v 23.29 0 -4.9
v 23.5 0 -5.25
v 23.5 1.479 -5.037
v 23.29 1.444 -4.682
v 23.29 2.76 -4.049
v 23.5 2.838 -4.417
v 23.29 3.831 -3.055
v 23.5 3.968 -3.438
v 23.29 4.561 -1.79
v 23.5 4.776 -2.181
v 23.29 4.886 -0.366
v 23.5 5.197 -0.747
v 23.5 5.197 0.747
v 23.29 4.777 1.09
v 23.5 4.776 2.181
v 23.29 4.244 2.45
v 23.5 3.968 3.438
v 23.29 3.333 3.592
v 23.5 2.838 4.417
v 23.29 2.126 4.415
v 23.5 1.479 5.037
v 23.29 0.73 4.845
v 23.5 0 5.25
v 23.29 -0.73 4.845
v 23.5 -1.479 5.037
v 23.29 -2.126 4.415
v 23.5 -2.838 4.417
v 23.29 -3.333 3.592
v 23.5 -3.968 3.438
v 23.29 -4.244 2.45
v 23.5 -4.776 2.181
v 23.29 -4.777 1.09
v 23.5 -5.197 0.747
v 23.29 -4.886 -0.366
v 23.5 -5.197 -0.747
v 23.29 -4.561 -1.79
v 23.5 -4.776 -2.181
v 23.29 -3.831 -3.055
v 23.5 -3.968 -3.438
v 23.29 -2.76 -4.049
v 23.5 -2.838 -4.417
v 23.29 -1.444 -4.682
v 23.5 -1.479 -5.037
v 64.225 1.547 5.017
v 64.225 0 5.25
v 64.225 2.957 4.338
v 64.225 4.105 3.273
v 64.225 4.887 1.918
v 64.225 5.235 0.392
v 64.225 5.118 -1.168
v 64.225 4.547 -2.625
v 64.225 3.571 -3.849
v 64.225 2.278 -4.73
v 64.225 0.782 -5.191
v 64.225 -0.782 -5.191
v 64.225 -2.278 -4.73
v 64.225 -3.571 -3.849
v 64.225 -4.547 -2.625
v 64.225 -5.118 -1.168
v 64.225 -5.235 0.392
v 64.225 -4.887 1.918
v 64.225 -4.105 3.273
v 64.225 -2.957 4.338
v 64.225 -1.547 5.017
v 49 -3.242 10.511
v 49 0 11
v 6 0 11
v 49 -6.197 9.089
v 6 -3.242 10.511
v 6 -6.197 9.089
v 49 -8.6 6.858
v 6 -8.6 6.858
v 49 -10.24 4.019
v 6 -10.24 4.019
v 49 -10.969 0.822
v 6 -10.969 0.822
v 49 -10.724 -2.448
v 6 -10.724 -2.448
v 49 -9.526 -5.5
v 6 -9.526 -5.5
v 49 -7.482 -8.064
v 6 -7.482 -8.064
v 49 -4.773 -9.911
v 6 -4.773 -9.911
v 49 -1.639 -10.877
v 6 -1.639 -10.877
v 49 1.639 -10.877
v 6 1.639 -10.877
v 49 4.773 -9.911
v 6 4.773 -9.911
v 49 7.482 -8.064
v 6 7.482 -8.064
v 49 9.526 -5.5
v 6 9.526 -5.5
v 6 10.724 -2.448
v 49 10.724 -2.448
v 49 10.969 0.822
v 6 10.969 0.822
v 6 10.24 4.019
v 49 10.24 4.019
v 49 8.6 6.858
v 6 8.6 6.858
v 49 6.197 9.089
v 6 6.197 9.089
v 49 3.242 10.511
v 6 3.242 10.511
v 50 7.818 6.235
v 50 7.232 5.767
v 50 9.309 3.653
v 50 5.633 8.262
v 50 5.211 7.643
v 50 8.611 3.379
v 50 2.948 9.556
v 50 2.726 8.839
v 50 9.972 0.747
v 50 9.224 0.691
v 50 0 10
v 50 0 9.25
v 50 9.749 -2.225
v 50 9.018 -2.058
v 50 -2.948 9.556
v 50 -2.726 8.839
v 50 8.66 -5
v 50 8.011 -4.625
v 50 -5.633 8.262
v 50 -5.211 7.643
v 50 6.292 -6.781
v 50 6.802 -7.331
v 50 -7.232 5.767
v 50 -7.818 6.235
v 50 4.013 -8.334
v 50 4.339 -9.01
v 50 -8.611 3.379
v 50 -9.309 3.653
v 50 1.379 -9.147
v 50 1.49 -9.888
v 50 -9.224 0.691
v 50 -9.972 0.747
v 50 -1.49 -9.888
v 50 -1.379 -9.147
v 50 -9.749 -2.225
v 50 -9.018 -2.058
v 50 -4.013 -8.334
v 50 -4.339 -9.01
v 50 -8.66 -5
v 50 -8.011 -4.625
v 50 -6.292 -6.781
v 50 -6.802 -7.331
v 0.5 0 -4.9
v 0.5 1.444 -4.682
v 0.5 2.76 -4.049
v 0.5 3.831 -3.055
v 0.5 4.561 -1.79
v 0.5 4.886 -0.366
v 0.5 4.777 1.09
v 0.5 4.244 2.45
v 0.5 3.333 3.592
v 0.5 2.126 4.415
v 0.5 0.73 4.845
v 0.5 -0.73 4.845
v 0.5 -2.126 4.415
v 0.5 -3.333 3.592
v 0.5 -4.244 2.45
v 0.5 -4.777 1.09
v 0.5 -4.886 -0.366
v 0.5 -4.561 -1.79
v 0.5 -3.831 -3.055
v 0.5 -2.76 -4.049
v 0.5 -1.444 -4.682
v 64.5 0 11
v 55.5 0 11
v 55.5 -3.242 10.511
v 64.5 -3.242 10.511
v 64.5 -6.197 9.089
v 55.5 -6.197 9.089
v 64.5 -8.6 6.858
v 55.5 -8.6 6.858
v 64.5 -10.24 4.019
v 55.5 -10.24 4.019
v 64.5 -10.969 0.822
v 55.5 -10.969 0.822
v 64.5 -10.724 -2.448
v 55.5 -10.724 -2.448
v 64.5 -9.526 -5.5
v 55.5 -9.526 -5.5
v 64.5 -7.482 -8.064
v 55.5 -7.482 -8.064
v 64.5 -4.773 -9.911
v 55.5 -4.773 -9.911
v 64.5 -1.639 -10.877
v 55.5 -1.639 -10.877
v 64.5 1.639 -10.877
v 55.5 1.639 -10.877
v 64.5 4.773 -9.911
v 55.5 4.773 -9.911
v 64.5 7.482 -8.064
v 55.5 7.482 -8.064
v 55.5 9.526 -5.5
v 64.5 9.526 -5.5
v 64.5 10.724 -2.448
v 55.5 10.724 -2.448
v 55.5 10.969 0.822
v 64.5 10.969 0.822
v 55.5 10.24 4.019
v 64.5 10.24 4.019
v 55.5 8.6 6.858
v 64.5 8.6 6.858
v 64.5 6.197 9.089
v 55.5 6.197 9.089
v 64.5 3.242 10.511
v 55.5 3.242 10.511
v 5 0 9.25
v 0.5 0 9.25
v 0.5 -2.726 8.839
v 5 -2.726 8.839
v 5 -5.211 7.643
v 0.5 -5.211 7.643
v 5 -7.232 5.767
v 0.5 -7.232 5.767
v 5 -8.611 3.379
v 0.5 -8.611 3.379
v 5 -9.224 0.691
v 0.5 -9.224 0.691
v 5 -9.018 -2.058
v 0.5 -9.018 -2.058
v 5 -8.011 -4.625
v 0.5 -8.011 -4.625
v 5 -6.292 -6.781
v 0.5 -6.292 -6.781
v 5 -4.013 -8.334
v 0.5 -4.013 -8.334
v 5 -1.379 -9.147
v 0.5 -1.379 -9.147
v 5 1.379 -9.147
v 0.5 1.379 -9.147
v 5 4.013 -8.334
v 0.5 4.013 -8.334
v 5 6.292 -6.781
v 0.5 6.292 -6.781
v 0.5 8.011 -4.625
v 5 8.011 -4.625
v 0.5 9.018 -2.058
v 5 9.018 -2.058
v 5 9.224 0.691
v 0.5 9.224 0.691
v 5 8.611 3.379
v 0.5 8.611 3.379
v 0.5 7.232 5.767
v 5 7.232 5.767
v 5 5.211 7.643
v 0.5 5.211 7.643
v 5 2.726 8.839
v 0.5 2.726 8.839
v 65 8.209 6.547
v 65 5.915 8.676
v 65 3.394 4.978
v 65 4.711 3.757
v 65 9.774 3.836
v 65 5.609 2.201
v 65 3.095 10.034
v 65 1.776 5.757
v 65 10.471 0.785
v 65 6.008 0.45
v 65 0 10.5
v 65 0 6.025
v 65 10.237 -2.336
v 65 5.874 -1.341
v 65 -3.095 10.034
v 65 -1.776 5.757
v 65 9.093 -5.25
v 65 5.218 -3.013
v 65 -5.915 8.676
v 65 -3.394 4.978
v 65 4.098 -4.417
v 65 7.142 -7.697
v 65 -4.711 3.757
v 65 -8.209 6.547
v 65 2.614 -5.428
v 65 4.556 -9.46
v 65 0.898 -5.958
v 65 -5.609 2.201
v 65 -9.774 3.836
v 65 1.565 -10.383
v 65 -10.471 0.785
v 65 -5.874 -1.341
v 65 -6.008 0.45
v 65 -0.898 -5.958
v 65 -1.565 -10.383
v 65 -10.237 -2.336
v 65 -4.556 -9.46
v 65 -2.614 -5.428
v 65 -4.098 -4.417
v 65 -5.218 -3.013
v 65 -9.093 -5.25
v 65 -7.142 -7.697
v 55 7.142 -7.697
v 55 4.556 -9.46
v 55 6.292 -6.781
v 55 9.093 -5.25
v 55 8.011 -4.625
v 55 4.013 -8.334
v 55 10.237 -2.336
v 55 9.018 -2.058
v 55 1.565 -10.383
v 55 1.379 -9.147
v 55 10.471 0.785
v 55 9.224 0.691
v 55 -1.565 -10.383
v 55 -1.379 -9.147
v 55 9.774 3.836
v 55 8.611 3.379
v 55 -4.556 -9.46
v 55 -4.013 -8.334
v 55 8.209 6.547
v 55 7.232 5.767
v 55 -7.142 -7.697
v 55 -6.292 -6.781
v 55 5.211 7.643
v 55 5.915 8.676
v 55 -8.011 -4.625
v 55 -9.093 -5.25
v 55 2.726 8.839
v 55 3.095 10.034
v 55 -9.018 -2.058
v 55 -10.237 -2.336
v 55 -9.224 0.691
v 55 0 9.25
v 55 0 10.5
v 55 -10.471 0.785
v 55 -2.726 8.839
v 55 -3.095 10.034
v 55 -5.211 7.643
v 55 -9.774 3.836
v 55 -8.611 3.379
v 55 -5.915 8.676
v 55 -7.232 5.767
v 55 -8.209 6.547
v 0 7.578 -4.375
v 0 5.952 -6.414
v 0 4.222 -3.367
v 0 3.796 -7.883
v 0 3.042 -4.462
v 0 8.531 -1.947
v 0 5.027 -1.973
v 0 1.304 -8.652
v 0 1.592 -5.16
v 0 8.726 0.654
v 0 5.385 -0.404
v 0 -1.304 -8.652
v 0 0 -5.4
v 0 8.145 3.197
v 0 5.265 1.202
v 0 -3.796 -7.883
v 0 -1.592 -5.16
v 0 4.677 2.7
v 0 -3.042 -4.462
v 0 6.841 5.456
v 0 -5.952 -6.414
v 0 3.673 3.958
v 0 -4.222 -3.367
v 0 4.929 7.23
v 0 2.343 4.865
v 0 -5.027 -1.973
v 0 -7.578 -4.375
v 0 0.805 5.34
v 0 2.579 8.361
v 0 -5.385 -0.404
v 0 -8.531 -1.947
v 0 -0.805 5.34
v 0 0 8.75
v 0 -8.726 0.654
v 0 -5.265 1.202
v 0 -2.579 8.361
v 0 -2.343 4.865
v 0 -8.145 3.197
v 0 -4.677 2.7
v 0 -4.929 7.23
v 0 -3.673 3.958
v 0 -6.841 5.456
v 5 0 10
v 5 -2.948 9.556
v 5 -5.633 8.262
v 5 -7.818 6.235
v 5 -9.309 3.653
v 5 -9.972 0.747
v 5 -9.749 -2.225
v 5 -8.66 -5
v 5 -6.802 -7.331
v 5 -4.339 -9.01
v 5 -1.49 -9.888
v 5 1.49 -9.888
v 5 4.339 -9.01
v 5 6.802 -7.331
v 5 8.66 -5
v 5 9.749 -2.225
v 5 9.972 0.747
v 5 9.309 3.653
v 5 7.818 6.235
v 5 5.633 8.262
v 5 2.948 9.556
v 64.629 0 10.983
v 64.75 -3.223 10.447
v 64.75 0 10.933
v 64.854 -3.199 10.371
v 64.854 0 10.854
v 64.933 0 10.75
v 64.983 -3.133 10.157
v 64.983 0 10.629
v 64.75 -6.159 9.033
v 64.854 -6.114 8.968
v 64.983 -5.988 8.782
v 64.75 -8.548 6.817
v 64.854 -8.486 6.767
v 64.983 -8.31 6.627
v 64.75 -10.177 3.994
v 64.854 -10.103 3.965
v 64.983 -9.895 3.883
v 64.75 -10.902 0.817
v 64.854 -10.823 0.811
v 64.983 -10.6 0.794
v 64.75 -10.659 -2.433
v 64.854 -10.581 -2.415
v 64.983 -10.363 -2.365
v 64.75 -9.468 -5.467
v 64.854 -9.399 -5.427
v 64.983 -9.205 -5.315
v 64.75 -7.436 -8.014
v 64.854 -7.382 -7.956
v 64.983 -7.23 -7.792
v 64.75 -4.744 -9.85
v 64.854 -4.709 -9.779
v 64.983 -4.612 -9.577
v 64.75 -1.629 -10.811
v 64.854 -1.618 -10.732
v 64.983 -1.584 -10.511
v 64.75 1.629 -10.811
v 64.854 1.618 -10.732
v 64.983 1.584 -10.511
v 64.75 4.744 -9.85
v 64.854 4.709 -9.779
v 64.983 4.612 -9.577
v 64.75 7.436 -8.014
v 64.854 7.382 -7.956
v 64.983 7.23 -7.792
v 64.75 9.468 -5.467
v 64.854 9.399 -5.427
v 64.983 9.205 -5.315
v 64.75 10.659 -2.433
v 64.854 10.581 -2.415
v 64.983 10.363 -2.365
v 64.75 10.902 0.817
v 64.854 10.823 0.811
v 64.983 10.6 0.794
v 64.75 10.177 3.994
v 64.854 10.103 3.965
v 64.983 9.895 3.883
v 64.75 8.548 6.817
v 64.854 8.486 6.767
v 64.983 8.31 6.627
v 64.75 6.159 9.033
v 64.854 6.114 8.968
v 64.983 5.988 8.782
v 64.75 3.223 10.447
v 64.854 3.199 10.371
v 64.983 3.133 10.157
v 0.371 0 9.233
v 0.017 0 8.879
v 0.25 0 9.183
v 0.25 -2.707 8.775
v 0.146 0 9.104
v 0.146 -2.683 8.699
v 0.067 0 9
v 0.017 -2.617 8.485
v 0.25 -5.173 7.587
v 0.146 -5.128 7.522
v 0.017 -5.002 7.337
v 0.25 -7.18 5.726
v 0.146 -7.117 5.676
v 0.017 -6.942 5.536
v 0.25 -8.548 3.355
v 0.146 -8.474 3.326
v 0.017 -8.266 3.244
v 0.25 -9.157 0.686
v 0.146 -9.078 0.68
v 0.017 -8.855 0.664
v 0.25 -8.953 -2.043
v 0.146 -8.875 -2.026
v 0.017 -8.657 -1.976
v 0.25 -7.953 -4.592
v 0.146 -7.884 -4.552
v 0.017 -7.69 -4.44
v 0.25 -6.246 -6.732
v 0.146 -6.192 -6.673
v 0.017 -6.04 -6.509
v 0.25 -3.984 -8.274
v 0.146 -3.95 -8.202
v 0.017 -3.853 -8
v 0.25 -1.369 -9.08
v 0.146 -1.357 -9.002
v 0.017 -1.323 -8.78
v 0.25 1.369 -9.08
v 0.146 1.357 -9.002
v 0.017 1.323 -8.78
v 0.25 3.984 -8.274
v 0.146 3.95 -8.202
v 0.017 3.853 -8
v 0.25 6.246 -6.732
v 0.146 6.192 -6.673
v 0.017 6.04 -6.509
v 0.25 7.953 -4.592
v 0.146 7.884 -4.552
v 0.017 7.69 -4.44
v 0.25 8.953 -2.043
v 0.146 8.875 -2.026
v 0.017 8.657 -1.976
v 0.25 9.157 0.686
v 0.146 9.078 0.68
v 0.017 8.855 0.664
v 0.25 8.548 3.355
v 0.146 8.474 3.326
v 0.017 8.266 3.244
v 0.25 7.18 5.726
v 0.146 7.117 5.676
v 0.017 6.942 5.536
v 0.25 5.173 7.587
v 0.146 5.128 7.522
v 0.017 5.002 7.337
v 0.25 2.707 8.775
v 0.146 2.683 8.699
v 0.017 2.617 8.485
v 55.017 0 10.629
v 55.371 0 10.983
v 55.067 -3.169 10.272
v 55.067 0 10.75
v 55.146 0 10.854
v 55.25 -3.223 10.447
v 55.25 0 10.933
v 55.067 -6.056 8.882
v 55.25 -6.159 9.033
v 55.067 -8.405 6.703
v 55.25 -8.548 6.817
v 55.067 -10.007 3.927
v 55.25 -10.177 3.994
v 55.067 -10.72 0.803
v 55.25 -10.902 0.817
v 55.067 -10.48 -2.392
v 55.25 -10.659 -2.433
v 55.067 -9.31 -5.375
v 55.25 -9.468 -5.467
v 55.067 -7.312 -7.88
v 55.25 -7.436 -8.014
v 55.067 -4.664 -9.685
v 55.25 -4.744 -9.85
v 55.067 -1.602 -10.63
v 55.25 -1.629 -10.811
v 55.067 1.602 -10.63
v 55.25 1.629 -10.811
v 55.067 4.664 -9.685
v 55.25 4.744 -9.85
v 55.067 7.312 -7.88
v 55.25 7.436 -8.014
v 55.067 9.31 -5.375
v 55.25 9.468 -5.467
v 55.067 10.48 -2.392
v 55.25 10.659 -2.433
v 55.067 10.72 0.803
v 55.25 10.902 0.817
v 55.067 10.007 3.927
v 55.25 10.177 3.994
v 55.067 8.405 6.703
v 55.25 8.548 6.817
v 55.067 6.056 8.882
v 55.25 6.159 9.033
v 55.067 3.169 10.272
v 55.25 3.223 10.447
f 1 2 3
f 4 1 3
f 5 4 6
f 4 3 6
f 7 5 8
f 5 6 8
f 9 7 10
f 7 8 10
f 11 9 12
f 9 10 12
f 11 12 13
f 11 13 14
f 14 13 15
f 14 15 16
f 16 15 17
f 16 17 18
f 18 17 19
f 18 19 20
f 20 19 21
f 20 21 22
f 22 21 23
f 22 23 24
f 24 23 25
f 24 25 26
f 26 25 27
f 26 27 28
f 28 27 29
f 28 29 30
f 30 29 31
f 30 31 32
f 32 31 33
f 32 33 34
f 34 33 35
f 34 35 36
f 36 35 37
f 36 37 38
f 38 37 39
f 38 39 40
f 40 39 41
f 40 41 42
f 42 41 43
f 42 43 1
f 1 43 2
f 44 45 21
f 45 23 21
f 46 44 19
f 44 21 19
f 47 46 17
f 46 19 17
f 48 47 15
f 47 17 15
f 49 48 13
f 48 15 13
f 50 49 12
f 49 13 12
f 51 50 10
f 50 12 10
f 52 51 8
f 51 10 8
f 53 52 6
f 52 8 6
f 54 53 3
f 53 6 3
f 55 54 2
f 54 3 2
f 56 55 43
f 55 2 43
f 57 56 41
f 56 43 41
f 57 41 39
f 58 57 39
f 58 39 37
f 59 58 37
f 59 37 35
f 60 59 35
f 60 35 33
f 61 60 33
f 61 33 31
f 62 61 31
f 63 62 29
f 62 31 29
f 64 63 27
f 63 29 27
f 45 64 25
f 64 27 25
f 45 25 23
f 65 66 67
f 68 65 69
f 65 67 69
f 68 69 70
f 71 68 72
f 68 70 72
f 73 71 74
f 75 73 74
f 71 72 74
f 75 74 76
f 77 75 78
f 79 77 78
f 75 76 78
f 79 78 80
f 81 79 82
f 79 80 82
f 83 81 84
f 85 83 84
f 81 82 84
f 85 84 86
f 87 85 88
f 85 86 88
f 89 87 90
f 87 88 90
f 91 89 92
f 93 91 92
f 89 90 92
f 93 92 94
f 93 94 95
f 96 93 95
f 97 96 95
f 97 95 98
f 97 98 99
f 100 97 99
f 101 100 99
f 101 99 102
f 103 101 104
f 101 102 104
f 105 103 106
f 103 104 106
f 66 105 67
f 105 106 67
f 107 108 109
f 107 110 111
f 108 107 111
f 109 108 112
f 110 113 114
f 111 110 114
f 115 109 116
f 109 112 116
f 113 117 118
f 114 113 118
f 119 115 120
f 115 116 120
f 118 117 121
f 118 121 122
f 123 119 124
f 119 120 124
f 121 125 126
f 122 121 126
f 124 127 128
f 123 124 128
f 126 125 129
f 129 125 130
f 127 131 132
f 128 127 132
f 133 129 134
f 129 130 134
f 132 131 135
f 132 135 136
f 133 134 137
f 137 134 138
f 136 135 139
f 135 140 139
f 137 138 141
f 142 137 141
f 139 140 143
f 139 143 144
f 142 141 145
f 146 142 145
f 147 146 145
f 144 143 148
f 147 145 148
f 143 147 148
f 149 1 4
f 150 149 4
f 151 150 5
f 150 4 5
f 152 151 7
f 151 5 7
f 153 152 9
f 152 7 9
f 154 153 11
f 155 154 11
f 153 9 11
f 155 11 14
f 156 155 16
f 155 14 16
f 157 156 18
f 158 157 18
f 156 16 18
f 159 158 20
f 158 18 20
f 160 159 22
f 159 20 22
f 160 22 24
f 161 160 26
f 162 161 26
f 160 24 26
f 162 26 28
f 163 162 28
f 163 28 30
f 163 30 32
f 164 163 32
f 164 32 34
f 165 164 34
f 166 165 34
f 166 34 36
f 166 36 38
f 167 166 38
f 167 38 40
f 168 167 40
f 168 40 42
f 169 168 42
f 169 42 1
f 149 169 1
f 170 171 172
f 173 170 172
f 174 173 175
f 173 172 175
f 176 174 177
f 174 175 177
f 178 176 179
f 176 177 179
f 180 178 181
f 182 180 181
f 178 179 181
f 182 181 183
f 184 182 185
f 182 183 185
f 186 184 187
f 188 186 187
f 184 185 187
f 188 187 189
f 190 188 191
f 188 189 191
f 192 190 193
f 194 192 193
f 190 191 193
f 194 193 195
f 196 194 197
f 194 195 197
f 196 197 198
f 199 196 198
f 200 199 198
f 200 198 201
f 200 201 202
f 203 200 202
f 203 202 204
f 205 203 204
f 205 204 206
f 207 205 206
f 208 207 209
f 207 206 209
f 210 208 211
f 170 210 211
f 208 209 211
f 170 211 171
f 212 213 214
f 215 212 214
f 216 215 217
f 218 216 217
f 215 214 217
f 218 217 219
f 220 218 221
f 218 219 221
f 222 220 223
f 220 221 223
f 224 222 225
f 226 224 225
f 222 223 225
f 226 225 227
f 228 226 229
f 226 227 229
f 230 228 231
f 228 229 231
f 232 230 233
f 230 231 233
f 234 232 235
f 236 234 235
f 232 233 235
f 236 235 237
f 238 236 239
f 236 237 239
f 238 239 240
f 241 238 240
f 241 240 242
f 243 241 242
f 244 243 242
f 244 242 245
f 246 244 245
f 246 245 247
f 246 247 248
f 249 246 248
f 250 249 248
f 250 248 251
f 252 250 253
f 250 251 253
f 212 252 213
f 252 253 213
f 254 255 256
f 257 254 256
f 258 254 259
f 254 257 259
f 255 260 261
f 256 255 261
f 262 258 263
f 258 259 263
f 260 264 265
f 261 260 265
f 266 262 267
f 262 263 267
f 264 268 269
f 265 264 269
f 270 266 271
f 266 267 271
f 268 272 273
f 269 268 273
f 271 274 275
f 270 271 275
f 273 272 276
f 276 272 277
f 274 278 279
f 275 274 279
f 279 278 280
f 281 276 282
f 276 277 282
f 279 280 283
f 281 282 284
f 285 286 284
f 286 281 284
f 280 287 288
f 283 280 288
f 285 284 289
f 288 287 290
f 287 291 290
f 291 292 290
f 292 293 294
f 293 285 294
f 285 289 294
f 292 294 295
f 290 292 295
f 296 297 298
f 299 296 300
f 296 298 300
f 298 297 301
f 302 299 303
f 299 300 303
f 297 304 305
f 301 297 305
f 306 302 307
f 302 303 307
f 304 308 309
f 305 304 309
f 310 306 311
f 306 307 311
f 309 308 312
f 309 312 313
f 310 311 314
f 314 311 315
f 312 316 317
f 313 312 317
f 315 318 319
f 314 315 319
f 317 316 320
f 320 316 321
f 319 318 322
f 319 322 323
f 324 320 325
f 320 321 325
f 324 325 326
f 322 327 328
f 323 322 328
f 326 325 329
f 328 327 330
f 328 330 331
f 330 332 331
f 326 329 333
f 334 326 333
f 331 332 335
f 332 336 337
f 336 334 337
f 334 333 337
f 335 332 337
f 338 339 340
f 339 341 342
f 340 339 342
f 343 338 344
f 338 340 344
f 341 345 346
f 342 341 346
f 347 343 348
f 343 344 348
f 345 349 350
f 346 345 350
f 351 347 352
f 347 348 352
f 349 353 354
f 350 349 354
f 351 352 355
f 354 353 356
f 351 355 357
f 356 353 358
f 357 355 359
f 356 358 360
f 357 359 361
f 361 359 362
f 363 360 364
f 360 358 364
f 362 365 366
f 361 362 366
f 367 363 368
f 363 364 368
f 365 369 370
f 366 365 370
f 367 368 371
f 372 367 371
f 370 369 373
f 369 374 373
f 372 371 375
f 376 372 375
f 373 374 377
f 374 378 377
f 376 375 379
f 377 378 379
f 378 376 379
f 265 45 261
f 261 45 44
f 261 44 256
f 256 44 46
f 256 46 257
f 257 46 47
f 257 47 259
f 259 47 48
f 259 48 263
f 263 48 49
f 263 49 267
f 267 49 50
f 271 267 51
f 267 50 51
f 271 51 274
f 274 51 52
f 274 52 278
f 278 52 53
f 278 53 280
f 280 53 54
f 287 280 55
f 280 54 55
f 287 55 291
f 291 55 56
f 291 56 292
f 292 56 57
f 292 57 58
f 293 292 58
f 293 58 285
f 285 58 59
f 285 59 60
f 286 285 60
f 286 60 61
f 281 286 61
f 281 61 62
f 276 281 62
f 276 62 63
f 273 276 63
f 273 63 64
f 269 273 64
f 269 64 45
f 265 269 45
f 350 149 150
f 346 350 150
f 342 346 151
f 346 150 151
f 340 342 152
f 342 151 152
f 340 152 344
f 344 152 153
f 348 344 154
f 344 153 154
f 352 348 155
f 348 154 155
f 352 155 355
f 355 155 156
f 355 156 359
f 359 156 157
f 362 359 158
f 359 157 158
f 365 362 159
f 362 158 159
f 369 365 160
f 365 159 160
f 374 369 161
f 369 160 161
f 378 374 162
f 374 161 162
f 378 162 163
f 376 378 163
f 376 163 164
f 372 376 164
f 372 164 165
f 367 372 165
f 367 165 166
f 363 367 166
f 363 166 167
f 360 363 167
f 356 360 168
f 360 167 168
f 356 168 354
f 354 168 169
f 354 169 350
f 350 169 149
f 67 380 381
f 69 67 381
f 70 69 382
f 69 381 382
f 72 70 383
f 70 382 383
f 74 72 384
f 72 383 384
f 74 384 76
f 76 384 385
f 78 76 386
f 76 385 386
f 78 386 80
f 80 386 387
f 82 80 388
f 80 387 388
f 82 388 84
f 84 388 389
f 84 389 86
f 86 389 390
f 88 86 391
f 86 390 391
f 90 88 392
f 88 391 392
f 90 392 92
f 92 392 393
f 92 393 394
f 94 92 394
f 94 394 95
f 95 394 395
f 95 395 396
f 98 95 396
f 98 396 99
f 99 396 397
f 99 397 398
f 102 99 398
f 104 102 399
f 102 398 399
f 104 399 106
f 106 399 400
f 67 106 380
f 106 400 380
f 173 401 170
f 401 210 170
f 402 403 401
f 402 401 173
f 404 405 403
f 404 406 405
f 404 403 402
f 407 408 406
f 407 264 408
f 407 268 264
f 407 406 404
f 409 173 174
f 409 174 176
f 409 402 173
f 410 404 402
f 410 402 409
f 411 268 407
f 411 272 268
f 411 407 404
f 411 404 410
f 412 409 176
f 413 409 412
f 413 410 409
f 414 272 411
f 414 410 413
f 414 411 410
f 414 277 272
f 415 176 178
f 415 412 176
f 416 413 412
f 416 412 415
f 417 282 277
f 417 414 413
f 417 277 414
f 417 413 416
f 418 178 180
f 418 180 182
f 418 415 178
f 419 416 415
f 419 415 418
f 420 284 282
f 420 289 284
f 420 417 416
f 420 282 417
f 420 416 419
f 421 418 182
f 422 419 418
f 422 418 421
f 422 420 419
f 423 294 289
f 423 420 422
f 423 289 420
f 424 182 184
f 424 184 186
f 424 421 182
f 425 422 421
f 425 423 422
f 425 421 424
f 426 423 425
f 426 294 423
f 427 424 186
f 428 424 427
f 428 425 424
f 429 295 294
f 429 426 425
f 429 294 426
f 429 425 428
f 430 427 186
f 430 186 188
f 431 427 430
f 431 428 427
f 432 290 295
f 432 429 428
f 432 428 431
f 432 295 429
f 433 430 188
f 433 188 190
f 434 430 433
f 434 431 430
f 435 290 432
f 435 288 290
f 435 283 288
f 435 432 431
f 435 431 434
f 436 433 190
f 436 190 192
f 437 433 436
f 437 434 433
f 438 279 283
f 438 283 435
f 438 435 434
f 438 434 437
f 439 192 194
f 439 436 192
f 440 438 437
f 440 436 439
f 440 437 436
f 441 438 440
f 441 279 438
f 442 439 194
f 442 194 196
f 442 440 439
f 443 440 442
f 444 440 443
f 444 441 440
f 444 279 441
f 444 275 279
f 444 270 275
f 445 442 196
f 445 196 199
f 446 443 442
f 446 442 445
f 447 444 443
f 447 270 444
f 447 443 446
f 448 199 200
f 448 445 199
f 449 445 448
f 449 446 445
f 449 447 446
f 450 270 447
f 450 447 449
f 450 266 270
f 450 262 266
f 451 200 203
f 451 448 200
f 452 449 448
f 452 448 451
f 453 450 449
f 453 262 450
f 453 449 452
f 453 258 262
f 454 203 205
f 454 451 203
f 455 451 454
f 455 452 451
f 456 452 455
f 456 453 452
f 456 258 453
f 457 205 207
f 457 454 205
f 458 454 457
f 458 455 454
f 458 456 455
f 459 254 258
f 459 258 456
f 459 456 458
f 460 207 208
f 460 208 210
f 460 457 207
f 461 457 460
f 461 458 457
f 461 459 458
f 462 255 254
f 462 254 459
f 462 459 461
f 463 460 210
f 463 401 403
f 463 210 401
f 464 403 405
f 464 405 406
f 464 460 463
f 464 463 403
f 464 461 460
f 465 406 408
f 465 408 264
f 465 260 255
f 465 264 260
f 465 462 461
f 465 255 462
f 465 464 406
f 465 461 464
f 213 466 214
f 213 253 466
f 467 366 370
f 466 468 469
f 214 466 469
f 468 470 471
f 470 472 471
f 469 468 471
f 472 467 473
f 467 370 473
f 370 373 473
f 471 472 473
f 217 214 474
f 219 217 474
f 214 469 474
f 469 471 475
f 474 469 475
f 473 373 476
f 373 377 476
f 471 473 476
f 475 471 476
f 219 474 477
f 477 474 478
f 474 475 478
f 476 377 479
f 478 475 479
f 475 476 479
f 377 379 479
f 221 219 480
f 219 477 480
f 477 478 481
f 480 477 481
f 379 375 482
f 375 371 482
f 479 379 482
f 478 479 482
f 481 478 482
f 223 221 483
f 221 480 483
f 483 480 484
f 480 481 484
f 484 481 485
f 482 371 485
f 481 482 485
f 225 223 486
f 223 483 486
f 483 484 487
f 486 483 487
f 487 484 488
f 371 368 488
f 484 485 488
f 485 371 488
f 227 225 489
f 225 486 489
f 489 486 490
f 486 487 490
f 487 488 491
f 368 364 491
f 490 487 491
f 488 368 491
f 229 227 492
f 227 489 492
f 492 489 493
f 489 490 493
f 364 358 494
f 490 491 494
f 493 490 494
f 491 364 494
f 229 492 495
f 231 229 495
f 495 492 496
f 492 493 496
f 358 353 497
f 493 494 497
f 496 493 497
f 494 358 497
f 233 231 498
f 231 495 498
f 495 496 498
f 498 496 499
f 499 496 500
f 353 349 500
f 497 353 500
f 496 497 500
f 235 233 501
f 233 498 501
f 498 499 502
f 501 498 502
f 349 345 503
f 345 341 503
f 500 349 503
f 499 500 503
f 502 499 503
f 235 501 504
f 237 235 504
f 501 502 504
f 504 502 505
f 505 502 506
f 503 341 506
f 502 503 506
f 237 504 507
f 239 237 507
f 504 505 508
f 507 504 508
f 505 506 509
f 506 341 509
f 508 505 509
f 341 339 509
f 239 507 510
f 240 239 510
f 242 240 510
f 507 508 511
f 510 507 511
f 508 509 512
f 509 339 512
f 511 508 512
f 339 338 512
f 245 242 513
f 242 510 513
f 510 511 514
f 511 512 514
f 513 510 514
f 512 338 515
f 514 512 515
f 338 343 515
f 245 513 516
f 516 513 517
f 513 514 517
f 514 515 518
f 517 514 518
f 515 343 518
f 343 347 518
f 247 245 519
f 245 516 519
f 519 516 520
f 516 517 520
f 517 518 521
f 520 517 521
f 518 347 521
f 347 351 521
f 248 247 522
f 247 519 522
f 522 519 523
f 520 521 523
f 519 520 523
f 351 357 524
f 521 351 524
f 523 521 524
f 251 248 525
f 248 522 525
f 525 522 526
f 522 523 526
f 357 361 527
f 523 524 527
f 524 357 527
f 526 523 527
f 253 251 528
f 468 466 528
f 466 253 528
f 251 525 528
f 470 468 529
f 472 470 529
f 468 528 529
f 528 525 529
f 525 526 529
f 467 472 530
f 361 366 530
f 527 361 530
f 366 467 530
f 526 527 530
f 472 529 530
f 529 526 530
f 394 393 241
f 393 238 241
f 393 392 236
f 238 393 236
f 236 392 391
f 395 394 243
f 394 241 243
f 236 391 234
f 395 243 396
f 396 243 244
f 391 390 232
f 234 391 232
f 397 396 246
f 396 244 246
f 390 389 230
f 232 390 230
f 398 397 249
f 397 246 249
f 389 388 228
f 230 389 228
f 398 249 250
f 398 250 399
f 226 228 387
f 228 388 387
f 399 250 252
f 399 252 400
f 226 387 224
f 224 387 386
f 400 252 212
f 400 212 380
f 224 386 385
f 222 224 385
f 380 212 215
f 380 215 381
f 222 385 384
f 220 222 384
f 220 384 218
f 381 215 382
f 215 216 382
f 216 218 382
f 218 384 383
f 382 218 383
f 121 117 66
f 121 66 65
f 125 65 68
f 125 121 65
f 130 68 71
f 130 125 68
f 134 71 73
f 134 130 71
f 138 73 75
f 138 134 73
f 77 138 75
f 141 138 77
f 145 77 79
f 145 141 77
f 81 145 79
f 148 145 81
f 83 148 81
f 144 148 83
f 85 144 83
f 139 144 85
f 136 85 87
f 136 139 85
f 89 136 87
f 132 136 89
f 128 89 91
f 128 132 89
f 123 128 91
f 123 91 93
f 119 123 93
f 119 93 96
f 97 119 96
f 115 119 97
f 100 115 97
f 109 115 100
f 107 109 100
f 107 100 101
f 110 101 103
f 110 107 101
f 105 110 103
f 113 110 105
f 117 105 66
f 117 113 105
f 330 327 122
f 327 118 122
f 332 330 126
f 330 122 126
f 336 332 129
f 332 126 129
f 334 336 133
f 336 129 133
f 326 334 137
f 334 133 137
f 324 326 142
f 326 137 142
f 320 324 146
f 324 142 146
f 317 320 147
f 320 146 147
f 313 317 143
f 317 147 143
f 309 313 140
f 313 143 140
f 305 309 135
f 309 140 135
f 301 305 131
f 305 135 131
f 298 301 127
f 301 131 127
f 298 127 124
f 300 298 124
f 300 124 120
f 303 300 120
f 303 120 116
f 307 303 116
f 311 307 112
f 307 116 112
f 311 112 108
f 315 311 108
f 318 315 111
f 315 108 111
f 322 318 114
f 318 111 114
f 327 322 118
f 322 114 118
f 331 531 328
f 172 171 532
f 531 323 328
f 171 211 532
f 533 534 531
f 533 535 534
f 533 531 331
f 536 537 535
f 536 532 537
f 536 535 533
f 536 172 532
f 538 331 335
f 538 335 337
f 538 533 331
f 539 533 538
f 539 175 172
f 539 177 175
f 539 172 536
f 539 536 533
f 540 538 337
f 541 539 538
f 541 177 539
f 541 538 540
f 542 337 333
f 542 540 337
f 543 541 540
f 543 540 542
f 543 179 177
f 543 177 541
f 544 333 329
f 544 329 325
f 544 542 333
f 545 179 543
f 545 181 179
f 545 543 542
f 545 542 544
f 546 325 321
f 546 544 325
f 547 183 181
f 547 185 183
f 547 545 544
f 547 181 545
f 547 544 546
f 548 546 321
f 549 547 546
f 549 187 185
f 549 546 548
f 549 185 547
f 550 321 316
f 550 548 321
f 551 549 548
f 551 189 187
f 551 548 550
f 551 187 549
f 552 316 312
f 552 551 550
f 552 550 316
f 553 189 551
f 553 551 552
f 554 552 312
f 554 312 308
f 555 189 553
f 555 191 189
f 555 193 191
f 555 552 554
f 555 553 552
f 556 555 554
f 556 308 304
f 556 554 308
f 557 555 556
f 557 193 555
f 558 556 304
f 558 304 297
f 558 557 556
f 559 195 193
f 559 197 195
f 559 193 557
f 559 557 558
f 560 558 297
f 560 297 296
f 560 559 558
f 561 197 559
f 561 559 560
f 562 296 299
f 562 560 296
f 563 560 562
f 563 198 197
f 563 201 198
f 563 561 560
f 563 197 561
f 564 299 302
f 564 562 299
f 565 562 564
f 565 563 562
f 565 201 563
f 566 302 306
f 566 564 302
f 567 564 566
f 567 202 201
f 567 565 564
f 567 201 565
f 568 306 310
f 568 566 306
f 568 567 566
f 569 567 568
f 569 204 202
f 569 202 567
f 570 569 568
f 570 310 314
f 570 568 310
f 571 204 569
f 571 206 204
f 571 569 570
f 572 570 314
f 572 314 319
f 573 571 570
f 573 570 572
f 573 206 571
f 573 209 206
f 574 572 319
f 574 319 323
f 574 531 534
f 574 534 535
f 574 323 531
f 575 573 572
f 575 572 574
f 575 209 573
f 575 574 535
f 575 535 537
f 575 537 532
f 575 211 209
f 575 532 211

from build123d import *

# Parameters (mm, degrees)
FURO_ROSCADO_DE_M12X1_51_D           = 10.5
FURO_ROSCADO_DE_M12X1_51_DEPTH       = 41.5
FURO_ROSCADO_DE_M12X1_51_CSINK_D     = 12.05
FURO_ROSCADO_DE_M12X1_51_CSINK_ANGLE = 90
FURO_ROSCADO_DE_M12X1_51_TIP         = 3.15451825
FURO1_D                              = 9.8
FURO1_DEPTH                          = 25
CHANFRO1_SIZE                        = 1
CHANFRO3_SIZE                        = 1
FILETE1_R                            = 0.5
CHANFRO4_SIZE                        = 0.5


with BuildPart() as part:
    # Esboço1 → Revolução1 (revolve)
    with BuildSketch(Plane.XY, mode=Mode.PRIVATE) as revolu_o1_sk:
        Polygon((0, 0), (65, 0), (65, 11), (55, 11), (55, 9.25), (50, 9.25), (50, 11), (5, 11), (5, 9.25), (0, 9.25), align=None)
    revolve(revolu_o1_sk.sketch.rotate(Axis((0, 0, 0), (1, 0, 0)), 90), axis=Axis((0, 0, 0), (1, 0, 0)))

    # Furo roscado de M12x1.51
    with Locations(Plane(origin=(65, 0, 0), x_dir=(0, 0, -1), z_dir=(1, 0, 0))):
        with Locations((0, 0)):
            CounterSinkHole(FURO_ROSCADO_DE_M12X1_51_D / 2, FURO_ROSCADO_DE_M12X1_51_CSINK_D / 2, depth=FURO_ROSCADO_DE_M12X1_51_DEPTH, counter_sink_angle=FURO_ROSCADO_DE_M12X1_51_CSINK_ANGLE)
            with Locations((0, 0, -(FURO_ROSCADO_DE_M12X1_51_DEPTH + FURO_ROSCADO_DE_M12X1_51_TIP / 2))):  # 118° drill point
                Cone(0, FURO_ROSCADO_DE_M12X1_51_D / 2, FURO_ROSCADO_DE_M12X1_51_TIP, mode=Mode.SUBTRACT)

    # Furo1
    with Locations(Plane.ZY):
        with Locations((0, 0)):
            Hole(FURO1_D / 2, depth=FURO1_DEPTH)

    # Chanfro1
    chanfro1_edges = [part.edges().sort_by_distance(p)[0] for p in [
        (5, 0, -11),
    ]]
    chamfer(chanfro1_edges, length=CHANFRO1_SIZE)

    # Chanfro3
    chanfro3_edges = [part.edges().sort_by_distance(p)[0] for p in [
        (50, 0, -11),
    ]]
    chamfer(chanfro3_edges, length=CHANFRO3_SIZE)

    # Filete1
    filete1_edges = [part.edges().sort_by_distance(p)[0] for p in [
        (65, 0, -11),
        (0, 0, -9.25),
        (55, 0, -11),
    ]]
    fillet(filete1_edges, radius=FILETE1_R)

    # Chanfro4
    chanfro4_edges = [part.edges().sort_by_distance(p)[0] for p in [
        (0, 0, 4.9),
    ]]
    chamfer(chanfro4_edges, length=CHANFRO4_SIZE)


solid = part.part
